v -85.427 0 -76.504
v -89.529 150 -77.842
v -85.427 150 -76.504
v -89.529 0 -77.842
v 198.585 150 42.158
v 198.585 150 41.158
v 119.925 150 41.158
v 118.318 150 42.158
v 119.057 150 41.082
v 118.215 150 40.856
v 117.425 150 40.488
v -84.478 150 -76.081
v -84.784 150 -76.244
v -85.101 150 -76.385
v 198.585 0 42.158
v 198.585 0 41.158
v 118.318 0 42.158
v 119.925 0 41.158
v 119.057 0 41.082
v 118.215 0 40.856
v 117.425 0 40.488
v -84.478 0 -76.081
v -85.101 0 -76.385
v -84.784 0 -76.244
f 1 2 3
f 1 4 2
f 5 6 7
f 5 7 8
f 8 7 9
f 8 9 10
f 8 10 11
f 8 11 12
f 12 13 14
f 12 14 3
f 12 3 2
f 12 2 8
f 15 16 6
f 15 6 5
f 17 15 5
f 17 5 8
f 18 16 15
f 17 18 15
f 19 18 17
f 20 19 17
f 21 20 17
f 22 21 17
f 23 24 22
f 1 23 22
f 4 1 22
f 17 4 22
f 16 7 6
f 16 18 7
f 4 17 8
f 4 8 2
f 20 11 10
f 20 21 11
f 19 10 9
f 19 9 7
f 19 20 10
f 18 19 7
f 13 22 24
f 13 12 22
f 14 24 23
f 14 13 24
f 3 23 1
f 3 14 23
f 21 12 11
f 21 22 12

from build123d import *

# Parameters (mm, degrees)
EXTRUDE_1_DEPTH = 10
EXTRUDE_2_DEPTH = 150
FILLET_1_R      = 5
FILLET_2_R      = 5


with BuildPart() as part:
    # 草图1 → 凸台-拉伸1 (new body)
    with BuildSketch(Plane(origin=(0, 0, 0), x_dir=(1, 0, 0), z_dir=(0, 1, 0))):
        Polygon((-84.930519712, 76.342229186), (118.585450177, -41.157770814), (198.585450177, -41.157770814), (198.585450177, -42.157770814), (118.317500985, -42.157770814), (-89.528595923, 77.842229186), align=None)
    extrude(amount=EXTRUDE_1_DEPTH)

    # 草图1<2> → 凸台-拉伸2 (add)
    with BuildSketch(Plane(origin=(0, 0, 0), x_dir=(1, 0, 0), z_dir=(0, 1, 0))):
        Polygon((-84.930519712, 76.342229186), (118.585450177, -41.157770814), (198.585450177, -41.157770814), (198.585450177, -42.157770814), (118.317500985, -42.157770814), (-89.528595923, 77.842229186), align=None)
    extrude(amount=EXTRUDE_2_DEPTH)

    # 圆角1
    fillet_1_edges = [part.edges().sort_by_distance(p)[0] for p in [
        (-84.930519712, 75, -76.342229186),
    ]]
    fillet(fillet_1_edges, radius=FILLET_1_R)

    # 圆角2
    fillet_2_edges = [part.edges().sort_by_distance(p)[0] for p in [
        (118.585450177, 75, 41.157770814),
    ]]
    fillet(fillet_2_edges, radius=FILLET_2_R)


solid = part.part
